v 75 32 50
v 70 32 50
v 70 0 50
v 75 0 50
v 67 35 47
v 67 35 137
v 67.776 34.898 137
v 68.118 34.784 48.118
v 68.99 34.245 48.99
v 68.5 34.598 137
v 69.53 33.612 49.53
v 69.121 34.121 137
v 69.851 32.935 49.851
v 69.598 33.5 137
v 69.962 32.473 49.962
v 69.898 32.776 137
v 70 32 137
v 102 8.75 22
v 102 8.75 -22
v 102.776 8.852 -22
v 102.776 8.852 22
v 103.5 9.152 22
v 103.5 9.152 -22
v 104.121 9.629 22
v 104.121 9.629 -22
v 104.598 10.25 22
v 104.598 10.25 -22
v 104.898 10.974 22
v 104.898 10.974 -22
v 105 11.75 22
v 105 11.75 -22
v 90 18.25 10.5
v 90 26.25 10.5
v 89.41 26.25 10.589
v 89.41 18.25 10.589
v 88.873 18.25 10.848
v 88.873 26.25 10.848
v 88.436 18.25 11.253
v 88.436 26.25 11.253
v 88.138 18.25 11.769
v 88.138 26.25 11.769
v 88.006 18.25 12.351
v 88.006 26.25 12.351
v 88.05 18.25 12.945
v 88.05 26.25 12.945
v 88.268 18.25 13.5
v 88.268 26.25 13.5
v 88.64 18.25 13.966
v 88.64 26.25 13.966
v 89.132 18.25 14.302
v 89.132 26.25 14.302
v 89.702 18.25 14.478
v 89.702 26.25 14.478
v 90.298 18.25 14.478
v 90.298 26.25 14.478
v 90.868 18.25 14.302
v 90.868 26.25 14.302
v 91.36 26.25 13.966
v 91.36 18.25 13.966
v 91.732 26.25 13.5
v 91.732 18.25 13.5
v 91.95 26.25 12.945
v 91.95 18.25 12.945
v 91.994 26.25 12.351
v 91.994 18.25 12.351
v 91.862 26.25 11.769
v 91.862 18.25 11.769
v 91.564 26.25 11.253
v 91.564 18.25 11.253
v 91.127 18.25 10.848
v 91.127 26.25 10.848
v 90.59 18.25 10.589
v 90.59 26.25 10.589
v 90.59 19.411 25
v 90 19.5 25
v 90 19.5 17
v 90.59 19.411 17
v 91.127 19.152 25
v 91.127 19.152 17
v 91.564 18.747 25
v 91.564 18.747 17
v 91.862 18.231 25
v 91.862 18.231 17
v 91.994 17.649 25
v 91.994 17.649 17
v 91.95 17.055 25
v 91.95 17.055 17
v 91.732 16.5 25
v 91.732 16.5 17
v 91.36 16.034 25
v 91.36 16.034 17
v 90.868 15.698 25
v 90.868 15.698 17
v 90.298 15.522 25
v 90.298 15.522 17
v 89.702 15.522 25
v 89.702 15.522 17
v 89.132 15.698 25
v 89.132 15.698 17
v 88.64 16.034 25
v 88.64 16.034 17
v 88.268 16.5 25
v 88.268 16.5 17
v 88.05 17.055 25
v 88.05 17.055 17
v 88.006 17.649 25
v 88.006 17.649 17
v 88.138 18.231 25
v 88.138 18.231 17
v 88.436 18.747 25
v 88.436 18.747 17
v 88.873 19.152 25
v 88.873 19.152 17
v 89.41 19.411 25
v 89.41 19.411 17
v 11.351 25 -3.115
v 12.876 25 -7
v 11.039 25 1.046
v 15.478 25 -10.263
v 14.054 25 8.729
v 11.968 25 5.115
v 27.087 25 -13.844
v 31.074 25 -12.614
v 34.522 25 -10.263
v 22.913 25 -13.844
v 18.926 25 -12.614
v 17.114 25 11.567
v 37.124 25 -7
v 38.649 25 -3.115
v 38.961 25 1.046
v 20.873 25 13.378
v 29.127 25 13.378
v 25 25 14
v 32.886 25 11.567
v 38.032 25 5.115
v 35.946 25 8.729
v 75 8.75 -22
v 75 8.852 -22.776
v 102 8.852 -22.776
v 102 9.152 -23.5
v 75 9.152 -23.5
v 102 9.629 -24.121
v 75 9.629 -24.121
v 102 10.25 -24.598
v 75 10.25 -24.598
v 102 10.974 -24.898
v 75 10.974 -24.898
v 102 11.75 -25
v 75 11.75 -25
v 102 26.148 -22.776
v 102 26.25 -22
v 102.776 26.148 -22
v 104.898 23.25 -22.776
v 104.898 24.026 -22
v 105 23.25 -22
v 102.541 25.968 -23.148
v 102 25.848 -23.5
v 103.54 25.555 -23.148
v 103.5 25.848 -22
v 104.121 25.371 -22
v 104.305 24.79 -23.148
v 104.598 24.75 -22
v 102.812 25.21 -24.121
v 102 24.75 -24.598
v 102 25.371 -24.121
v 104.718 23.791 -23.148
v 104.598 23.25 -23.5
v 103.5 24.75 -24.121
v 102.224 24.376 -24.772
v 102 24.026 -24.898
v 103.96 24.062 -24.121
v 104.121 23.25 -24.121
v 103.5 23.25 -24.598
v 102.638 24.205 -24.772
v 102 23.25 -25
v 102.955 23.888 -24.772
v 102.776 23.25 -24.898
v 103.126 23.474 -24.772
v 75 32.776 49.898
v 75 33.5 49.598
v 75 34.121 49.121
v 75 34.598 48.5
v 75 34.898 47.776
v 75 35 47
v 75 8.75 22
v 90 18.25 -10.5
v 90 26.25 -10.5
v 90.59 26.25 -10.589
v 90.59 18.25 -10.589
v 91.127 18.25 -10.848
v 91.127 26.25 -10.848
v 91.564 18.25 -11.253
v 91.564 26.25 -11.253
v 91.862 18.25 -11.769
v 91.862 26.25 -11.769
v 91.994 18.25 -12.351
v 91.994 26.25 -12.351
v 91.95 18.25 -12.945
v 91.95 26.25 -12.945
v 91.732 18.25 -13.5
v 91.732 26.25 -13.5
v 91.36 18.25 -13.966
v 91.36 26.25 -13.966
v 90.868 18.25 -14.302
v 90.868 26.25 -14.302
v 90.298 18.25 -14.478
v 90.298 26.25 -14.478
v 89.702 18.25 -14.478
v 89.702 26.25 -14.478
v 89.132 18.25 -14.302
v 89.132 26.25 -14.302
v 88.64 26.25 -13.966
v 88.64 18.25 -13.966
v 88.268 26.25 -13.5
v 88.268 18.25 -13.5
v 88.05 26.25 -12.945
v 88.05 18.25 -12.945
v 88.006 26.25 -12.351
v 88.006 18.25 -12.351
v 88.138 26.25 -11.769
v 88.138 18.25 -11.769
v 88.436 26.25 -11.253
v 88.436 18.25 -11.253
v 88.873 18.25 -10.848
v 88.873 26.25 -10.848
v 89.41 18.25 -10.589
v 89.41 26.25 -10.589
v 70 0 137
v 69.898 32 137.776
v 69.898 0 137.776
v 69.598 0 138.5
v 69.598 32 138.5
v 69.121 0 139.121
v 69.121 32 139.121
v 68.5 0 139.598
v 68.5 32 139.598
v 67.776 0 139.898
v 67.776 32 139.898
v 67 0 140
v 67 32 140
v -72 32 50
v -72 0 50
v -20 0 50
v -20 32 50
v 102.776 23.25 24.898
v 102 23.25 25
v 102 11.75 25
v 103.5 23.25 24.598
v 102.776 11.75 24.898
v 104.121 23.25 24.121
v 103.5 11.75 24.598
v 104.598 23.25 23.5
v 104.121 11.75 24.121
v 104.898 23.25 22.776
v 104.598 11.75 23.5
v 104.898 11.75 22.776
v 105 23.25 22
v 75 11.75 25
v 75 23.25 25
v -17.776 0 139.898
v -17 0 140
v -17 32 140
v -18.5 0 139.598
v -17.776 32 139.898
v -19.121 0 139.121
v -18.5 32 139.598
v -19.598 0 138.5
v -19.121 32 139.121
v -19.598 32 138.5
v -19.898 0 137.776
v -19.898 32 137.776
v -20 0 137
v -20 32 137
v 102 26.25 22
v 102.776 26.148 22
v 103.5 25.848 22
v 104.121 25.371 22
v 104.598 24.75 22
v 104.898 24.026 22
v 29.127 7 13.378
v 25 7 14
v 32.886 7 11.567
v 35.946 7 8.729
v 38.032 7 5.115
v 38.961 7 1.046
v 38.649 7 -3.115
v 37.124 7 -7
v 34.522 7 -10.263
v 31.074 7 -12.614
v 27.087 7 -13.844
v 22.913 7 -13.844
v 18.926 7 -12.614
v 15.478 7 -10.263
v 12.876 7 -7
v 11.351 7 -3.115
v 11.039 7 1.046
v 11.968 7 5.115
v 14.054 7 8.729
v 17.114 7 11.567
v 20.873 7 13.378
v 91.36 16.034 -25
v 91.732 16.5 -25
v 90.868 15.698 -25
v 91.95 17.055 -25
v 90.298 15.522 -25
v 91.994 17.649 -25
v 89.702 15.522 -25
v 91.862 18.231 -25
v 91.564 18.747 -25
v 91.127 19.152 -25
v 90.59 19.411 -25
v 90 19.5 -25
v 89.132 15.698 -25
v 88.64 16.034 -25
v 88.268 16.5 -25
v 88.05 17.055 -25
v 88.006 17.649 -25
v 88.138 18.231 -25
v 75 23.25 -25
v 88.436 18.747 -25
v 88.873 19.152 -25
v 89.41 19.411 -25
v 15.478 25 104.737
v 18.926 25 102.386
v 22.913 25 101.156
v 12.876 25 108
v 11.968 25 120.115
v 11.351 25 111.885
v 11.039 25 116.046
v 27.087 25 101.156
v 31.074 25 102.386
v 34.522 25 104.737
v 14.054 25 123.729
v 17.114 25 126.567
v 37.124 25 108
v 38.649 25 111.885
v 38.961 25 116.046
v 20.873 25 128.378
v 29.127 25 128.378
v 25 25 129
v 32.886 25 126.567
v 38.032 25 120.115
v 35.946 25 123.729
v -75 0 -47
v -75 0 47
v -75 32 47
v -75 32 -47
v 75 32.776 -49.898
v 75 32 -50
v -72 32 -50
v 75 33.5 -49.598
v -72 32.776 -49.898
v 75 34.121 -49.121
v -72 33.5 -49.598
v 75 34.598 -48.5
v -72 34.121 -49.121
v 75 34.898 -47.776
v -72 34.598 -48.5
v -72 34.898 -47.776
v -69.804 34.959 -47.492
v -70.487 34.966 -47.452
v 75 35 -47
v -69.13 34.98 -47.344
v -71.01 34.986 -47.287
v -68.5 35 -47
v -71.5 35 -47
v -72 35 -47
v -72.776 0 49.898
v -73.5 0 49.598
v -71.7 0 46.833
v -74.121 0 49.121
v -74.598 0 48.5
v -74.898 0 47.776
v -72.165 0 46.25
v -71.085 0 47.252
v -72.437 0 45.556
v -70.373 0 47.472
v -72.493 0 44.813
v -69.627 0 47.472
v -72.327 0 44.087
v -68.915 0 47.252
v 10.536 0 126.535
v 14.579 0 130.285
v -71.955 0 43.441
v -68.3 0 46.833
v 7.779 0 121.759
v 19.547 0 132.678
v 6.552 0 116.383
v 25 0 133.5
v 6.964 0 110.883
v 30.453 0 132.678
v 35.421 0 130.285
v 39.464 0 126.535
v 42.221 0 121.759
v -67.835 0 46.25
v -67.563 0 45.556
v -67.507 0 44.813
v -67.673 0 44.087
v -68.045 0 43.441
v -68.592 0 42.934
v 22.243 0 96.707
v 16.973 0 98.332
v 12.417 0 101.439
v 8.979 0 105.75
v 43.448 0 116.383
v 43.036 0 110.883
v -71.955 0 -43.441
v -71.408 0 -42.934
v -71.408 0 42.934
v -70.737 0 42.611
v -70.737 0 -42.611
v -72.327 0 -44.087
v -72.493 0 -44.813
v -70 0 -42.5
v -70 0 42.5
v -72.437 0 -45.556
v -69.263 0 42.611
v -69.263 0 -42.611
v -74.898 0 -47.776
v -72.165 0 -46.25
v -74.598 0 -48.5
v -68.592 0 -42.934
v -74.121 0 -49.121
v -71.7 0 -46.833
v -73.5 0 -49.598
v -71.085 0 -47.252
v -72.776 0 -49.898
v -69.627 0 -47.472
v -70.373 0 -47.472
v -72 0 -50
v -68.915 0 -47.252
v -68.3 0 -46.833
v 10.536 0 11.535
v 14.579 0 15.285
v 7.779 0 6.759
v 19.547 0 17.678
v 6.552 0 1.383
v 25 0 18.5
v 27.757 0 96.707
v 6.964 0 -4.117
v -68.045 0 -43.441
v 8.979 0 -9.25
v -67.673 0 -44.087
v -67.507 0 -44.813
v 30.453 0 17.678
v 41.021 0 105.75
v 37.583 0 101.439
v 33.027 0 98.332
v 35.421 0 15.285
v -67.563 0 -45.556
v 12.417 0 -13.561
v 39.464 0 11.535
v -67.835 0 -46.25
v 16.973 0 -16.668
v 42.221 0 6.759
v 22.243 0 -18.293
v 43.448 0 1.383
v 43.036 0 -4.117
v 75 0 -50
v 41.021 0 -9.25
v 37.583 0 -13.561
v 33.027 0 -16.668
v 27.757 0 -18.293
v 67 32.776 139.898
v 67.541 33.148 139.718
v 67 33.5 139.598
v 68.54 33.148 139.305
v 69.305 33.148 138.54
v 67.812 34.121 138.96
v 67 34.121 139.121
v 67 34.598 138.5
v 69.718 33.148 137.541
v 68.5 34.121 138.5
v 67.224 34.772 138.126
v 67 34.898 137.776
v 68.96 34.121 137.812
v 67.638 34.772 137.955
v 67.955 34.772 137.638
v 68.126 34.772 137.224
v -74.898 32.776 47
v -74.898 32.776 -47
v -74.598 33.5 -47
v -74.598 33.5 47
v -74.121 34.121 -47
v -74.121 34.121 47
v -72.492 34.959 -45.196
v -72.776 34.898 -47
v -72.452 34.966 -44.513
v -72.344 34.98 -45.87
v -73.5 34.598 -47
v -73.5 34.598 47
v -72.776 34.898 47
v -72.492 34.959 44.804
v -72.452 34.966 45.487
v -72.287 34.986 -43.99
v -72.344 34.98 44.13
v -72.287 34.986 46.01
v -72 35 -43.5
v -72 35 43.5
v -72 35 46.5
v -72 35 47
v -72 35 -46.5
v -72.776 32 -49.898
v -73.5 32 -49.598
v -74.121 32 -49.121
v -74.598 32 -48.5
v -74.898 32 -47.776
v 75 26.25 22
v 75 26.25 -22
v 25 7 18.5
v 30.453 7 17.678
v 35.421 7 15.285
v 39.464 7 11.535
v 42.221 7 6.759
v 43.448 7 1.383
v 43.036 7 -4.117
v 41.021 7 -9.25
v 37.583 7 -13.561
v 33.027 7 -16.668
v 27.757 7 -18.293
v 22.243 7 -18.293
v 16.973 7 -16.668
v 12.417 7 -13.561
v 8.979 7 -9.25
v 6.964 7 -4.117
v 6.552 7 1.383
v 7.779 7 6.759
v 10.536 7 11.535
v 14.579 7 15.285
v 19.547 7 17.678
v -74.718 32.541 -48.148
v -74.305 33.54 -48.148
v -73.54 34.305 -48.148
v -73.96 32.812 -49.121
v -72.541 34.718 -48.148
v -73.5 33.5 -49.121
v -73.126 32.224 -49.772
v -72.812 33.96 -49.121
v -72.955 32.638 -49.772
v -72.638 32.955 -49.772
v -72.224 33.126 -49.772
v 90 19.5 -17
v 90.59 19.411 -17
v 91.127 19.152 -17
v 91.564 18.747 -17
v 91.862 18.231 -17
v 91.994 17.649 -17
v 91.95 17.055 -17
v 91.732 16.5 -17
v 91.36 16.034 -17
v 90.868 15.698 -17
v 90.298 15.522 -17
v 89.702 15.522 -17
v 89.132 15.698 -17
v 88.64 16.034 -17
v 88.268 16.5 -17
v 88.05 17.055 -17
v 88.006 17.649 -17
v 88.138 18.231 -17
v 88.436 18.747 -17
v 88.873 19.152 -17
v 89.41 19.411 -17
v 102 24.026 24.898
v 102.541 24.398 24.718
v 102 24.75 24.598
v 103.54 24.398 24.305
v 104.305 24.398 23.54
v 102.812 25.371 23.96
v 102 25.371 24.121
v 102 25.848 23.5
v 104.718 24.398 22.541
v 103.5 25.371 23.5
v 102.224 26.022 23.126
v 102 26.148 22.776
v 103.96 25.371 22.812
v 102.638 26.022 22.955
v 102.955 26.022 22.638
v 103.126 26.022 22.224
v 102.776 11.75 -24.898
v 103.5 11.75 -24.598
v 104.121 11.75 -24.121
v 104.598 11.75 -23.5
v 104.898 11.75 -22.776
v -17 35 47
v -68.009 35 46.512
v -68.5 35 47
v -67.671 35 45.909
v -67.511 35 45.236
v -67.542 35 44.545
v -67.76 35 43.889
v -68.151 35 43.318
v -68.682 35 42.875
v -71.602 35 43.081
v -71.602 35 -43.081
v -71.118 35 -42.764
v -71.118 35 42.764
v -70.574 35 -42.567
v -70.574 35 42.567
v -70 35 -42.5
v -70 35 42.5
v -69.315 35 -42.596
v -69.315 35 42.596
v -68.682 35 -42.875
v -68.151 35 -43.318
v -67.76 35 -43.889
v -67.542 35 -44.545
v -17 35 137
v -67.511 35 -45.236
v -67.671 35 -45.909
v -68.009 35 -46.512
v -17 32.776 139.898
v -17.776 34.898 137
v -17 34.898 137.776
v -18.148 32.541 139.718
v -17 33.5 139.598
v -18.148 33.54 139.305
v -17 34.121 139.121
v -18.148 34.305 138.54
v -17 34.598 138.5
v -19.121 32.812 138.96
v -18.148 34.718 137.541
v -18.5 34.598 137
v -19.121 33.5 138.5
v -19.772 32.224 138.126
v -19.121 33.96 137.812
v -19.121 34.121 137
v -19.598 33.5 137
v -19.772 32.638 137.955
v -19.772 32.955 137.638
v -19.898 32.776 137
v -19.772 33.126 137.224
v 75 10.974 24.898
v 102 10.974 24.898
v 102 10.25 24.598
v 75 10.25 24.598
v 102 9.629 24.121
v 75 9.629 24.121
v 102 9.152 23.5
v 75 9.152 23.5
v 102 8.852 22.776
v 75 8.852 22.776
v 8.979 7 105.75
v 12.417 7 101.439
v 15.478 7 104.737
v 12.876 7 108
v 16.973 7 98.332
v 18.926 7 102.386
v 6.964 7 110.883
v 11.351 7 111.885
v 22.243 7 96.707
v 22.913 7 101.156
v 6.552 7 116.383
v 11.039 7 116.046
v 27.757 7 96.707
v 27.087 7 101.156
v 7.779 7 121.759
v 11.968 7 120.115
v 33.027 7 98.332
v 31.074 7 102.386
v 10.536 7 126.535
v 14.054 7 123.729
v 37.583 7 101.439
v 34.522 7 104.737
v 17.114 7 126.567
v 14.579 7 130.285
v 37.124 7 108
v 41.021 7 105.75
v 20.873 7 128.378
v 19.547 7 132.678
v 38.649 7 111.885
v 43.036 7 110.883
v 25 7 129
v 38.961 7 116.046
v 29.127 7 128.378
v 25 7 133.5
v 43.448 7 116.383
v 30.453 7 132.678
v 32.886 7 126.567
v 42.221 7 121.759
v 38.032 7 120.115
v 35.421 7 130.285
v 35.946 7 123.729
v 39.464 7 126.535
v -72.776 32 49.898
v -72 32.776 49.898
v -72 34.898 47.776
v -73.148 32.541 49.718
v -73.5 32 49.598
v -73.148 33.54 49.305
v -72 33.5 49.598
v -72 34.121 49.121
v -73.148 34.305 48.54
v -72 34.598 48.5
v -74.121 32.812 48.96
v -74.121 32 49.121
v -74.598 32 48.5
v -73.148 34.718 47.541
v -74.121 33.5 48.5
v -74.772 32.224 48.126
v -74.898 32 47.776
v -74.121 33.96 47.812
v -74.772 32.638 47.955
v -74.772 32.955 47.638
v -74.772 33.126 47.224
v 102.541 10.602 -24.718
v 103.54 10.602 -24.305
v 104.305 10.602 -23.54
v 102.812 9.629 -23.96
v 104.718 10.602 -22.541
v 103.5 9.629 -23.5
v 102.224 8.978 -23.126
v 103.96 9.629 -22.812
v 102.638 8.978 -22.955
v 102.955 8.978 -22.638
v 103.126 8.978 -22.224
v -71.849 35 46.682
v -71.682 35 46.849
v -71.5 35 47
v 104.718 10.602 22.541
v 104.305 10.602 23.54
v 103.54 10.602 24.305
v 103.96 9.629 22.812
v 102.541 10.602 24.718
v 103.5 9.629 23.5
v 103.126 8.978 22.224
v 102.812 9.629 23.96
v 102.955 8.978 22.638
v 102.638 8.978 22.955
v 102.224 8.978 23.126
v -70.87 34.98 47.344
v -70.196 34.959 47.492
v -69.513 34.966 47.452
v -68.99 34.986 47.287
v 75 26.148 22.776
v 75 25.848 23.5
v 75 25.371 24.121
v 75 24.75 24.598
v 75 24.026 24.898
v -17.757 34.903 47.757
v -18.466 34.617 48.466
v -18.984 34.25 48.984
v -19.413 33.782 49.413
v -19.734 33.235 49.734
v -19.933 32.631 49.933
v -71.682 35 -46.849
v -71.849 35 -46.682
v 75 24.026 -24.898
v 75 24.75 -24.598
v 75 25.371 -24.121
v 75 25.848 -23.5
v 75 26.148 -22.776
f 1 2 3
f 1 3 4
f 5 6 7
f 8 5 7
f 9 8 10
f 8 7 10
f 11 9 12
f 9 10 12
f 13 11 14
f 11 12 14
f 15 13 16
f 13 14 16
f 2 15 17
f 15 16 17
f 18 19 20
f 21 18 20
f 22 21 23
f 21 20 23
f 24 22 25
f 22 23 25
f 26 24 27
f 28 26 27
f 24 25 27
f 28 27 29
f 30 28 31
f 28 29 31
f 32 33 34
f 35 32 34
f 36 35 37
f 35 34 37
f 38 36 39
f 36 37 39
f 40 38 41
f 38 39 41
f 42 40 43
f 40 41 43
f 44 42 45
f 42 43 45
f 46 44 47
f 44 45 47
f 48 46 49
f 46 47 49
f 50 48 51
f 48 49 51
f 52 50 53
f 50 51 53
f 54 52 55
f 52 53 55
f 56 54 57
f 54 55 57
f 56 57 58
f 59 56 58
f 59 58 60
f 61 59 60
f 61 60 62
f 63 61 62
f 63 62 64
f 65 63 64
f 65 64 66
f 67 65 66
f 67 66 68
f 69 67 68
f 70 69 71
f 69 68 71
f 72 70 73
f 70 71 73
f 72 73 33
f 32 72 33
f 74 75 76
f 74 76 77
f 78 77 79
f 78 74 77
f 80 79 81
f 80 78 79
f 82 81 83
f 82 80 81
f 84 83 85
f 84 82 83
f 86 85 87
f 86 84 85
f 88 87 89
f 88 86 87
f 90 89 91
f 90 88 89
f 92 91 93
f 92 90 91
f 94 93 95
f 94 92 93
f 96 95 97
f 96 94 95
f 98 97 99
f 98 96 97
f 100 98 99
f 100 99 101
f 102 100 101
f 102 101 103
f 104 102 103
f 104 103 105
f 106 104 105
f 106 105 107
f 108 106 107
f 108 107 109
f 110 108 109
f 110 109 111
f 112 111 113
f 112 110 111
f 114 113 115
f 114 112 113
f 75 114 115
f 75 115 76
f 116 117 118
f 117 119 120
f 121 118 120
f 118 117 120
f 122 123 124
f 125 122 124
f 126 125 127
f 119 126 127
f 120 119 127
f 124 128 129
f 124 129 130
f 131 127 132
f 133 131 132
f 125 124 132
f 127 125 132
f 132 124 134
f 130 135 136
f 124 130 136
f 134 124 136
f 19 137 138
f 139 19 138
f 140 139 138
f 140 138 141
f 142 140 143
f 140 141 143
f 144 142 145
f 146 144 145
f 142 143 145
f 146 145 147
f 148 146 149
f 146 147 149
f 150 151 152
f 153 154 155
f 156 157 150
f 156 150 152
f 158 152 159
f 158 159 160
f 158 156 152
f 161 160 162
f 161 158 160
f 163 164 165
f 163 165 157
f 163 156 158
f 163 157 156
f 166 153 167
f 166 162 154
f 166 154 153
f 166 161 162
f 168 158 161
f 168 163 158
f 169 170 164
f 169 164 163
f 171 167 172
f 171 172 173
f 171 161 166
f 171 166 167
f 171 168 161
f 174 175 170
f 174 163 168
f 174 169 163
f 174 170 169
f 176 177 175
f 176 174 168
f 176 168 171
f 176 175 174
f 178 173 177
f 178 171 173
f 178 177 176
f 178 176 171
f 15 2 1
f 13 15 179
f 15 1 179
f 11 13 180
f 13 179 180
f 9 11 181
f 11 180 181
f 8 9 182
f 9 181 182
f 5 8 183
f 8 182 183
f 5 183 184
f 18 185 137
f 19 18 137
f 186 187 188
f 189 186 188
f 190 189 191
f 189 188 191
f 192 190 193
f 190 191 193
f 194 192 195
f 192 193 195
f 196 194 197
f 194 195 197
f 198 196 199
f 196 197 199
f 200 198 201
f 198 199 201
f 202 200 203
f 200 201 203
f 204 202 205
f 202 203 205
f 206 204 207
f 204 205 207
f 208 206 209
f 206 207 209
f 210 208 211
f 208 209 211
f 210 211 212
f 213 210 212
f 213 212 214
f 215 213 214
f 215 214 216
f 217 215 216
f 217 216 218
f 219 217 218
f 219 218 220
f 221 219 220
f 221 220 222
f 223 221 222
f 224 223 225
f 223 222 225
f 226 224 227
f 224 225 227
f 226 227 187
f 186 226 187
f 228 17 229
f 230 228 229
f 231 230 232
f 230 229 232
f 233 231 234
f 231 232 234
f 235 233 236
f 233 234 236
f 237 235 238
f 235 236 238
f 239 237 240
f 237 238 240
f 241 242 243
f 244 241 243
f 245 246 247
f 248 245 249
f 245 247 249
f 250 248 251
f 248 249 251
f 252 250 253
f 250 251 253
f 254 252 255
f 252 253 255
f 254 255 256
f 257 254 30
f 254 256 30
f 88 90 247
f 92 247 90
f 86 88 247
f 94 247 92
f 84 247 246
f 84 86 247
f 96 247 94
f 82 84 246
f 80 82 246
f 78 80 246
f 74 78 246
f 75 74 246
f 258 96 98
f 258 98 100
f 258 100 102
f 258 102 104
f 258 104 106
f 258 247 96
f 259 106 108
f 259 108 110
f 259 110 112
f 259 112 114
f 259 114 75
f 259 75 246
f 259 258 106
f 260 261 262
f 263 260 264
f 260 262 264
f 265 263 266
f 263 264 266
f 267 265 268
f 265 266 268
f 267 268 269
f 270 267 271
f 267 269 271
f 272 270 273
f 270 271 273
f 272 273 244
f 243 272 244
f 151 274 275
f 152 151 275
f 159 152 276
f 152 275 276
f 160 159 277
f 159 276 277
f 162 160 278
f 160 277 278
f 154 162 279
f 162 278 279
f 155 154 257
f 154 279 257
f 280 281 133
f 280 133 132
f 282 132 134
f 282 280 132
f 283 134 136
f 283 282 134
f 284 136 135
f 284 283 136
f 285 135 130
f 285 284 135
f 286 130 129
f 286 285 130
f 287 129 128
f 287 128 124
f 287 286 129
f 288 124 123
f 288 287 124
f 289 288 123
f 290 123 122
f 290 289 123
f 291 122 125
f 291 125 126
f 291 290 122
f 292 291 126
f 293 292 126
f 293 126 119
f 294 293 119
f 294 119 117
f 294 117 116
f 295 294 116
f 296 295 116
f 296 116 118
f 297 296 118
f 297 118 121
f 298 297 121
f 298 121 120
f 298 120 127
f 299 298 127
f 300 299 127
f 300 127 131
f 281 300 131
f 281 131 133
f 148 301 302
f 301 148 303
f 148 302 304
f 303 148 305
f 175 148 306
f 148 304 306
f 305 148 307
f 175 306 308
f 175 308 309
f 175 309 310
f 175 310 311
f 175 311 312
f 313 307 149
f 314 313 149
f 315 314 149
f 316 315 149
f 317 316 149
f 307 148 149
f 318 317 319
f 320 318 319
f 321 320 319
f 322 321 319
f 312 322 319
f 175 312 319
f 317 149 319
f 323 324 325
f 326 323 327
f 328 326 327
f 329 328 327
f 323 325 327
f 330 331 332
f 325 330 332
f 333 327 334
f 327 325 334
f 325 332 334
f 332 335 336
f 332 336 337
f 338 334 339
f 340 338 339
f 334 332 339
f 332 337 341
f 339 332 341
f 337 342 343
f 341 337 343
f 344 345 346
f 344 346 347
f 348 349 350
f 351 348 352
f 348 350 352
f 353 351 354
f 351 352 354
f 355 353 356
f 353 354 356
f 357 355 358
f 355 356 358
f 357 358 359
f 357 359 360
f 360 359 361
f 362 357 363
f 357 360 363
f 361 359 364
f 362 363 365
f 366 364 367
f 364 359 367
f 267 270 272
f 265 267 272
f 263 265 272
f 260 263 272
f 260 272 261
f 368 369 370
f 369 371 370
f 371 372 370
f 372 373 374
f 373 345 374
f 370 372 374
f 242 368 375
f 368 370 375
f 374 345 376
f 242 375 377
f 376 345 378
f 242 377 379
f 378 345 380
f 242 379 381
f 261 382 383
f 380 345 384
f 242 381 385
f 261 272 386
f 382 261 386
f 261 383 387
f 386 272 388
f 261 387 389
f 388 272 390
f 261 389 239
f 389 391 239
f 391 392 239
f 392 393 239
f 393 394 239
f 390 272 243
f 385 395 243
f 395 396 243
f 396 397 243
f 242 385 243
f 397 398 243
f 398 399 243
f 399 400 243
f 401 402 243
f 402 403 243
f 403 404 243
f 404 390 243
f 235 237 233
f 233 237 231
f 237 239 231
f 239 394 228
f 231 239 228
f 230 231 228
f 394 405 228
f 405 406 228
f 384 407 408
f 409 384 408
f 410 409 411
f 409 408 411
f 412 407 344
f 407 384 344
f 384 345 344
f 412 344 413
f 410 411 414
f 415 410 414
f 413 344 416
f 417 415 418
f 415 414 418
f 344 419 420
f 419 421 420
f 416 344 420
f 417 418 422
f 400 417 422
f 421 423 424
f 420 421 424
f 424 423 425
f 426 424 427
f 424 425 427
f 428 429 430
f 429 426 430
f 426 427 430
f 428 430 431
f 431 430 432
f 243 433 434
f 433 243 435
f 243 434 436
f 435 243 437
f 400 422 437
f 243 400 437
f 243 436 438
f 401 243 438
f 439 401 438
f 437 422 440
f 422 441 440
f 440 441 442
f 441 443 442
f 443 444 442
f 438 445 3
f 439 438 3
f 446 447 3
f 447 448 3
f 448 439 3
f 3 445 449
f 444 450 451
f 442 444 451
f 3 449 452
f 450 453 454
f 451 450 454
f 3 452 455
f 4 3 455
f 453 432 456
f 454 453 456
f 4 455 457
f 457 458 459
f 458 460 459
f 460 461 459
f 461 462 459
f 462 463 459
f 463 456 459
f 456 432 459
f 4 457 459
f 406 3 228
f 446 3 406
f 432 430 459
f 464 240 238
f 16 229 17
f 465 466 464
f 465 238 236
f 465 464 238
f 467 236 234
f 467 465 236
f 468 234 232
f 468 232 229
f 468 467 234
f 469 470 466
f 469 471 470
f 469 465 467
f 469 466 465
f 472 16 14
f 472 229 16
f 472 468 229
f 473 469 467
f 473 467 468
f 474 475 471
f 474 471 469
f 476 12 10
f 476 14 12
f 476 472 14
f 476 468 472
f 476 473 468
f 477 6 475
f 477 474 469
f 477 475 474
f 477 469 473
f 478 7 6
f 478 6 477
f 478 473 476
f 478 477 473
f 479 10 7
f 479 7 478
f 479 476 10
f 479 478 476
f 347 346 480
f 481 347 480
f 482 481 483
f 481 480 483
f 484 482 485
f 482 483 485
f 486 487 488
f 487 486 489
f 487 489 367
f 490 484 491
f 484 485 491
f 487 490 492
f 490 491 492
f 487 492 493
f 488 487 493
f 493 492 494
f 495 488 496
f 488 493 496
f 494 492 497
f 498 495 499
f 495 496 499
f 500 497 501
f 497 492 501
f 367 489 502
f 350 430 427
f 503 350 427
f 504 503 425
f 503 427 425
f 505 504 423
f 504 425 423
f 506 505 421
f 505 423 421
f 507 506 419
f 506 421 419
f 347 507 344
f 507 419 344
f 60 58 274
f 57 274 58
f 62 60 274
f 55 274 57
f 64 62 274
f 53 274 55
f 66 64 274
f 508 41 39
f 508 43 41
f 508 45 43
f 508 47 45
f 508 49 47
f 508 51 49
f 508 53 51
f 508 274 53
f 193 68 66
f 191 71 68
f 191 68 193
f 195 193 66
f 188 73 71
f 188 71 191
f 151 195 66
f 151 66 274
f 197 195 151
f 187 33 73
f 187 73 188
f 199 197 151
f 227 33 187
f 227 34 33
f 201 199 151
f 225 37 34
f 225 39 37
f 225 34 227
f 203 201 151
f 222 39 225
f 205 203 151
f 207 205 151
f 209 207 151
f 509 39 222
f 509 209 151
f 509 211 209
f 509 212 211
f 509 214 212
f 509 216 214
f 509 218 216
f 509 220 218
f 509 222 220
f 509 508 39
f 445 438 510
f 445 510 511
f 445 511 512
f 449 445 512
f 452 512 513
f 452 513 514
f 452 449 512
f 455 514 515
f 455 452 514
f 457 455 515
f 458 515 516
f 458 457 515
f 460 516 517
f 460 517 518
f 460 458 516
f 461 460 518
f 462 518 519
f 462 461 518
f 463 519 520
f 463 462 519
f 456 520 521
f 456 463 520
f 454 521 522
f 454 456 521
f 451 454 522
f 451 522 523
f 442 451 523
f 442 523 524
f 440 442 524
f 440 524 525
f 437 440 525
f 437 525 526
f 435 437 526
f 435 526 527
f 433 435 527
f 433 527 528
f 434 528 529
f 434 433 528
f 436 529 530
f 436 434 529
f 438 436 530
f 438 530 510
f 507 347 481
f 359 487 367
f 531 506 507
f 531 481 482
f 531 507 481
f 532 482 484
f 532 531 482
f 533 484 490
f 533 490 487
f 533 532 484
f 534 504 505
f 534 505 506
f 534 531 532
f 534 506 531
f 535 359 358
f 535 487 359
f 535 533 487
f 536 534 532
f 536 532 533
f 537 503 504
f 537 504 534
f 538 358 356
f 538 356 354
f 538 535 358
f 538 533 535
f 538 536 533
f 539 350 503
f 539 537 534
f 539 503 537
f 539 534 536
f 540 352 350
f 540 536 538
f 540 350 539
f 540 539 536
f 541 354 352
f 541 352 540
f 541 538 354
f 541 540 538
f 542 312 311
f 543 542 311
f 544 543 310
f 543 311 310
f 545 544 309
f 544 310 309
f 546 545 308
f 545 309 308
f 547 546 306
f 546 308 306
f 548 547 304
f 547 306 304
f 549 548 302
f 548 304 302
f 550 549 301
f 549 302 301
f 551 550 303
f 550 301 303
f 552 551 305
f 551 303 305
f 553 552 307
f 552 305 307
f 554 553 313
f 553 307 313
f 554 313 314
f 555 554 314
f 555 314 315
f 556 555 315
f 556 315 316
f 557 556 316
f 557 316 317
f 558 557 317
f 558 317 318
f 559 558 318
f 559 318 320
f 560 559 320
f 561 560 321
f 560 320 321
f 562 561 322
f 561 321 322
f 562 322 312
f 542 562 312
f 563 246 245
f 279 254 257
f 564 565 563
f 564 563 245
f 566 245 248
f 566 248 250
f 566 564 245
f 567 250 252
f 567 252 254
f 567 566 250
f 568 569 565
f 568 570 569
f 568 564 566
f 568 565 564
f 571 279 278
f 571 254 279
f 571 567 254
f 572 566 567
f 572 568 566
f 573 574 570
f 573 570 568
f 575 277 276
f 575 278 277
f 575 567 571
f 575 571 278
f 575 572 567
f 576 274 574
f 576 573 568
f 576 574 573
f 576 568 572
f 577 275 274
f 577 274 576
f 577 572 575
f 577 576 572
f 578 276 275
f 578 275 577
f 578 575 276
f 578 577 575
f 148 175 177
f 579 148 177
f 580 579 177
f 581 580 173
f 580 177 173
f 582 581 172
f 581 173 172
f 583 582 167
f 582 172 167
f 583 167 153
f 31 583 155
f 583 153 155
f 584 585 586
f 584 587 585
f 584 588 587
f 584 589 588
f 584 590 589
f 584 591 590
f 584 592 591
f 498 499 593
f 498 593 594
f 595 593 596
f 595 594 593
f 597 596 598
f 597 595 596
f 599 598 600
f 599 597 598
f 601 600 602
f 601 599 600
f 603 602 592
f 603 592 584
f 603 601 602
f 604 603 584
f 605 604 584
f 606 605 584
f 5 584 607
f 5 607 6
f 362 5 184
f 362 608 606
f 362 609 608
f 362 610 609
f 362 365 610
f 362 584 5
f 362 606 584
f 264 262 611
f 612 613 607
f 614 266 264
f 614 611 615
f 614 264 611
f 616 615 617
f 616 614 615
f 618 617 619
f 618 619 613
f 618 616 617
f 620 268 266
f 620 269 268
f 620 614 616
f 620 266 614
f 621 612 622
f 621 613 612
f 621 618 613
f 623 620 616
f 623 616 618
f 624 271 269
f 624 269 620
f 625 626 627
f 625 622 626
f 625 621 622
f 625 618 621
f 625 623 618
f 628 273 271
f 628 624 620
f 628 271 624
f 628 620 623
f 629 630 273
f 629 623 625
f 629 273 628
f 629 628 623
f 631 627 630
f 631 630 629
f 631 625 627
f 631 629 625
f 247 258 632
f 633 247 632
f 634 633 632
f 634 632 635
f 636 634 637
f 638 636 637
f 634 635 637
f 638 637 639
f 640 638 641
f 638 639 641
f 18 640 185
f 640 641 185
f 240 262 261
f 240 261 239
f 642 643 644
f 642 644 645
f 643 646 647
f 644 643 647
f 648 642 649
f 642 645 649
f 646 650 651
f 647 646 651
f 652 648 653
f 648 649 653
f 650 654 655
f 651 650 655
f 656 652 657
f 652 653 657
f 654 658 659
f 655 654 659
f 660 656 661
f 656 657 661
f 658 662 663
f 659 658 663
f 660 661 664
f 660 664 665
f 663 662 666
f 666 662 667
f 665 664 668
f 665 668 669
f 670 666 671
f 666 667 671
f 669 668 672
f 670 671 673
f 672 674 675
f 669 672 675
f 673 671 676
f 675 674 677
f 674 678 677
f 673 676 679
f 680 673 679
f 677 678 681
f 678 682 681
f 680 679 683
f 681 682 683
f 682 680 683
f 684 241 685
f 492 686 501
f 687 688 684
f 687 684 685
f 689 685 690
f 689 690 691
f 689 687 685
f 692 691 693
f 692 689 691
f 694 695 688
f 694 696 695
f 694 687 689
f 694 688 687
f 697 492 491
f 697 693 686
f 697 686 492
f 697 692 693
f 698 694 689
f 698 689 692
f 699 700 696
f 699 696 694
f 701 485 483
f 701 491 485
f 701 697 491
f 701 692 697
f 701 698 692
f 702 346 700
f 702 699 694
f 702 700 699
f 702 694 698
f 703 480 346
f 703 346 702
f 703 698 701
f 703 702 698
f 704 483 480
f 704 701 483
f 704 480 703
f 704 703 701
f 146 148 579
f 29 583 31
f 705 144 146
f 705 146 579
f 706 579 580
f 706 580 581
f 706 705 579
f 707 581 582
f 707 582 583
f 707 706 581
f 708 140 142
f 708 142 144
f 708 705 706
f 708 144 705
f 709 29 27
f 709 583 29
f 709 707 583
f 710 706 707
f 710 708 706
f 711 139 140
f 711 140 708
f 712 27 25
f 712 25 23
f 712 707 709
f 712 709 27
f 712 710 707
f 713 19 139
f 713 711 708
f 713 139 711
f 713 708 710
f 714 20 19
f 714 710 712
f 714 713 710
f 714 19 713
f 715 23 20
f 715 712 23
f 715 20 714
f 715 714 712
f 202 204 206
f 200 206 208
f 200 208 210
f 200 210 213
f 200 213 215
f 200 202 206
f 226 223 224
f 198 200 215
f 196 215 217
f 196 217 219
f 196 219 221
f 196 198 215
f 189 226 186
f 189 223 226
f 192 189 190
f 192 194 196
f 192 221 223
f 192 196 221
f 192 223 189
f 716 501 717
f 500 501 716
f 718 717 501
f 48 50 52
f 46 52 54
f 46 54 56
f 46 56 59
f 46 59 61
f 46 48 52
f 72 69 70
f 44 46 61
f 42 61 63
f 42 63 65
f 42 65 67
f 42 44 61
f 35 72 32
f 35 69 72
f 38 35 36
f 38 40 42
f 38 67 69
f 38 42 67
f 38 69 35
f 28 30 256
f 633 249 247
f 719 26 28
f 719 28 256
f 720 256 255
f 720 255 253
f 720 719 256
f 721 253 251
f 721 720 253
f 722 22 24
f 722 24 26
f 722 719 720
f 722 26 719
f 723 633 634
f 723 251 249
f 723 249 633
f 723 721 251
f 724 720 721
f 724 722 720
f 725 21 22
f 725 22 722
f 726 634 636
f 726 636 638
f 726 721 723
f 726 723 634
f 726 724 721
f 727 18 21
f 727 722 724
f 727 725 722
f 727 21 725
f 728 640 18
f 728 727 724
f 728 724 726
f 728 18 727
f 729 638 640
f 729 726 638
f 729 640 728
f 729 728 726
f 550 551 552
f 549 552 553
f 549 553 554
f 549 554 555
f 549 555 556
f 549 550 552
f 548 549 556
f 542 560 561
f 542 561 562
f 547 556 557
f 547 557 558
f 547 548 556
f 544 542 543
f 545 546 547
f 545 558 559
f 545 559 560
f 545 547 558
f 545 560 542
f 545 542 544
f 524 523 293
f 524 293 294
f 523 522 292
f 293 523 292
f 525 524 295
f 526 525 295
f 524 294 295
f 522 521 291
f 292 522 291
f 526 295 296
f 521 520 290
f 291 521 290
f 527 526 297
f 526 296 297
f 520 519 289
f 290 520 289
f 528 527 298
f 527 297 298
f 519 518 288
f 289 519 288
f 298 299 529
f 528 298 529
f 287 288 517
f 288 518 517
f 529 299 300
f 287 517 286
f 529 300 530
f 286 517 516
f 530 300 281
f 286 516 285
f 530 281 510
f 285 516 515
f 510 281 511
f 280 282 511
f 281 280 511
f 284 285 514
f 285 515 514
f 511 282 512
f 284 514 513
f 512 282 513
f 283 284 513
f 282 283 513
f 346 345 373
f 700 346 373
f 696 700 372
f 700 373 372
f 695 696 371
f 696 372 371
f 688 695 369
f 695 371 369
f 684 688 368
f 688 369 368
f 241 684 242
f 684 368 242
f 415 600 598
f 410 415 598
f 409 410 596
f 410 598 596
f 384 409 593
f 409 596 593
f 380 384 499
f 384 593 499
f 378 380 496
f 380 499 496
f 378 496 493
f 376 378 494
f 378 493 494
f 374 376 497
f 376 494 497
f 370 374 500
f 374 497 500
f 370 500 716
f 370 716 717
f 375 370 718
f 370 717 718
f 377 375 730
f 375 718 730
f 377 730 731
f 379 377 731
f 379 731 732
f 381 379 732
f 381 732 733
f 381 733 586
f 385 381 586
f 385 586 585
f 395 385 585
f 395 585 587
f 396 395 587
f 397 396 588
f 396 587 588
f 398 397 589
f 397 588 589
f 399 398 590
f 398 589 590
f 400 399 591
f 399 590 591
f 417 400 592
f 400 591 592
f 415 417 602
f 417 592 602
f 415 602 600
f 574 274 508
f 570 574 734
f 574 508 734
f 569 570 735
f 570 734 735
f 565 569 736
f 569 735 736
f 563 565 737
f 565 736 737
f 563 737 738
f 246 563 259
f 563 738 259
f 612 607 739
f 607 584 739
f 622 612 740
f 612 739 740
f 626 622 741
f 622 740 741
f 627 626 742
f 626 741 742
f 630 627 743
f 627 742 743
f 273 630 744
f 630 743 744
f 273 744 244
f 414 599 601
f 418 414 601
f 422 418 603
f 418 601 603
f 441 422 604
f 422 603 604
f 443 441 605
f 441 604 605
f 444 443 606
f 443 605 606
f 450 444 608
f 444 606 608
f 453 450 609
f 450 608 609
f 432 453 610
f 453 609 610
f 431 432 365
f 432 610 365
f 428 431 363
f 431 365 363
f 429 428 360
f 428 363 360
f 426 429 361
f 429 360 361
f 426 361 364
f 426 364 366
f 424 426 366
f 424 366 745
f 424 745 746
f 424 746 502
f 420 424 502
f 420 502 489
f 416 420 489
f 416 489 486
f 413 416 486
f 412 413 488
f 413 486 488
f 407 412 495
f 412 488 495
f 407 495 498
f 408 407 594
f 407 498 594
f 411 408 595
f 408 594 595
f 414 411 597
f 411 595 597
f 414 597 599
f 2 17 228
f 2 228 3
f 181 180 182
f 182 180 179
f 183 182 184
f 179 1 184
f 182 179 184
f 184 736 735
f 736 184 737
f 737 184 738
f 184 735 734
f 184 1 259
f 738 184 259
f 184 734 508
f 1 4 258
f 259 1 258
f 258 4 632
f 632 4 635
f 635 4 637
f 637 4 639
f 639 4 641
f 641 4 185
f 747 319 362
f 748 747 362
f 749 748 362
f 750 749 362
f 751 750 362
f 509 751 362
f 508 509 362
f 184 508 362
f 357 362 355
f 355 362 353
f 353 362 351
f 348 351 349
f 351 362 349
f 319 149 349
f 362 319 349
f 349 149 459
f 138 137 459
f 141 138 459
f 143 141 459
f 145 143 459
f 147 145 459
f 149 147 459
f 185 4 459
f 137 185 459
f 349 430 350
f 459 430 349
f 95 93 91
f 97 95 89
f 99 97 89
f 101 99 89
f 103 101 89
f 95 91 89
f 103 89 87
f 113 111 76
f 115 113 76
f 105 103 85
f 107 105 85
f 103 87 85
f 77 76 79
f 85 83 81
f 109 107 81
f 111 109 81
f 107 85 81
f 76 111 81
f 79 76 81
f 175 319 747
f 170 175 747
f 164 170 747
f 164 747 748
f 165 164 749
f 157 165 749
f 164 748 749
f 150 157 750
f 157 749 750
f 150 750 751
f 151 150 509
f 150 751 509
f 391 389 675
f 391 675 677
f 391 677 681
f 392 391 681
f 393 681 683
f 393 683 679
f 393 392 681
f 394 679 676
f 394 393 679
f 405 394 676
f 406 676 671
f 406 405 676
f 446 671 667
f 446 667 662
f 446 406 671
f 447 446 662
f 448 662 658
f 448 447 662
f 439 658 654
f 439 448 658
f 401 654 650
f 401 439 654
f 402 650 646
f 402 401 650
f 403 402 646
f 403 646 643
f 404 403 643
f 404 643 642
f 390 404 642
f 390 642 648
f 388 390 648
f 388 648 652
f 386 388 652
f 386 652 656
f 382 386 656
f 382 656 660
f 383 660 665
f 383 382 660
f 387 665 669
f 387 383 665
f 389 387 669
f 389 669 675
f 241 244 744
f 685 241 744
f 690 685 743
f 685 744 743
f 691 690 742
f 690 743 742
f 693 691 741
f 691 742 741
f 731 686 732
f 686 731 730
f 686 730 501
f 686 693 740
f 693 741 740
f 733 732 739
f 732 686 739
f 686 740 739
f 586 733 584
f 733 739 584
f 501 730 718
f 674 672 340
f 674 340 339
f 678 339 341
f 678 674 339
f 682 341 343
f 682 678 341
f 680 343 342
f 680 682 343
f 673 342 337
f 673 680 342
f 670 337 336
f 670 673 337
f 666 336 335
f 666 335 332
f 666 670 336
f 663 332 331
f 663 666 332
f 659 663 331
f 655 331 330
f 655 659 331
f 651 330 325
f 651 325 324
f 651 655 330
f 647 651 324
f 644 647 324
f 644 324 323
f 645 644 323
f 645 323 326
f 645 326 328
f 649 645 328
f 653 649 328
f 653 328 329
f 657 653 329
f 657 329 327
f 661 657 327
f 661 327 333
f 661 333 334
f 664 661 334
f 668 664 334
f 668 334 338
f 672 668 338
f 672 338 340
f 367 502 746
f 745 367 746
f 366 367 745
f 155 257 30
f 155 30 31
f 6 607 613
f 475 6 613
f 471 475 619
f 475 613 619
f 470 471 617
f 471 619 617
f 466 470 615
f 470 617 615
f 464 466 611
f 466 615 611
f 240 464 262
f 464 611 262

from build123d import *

# Parameters (mm, degrees)
SKETCH1_W           = 150
SKETCH1_H           = 100
BOSS_EXTRUDE1_DEPTH = 35
SKETCH2_R           = 2.5
CUT_EXTRUDE1_DEPTH  = 97.695398029
SKETCH3_W           = 90
SKETCH3_H           = 90
BOSS_EXTRUDE2_DEPTH = 35
CUT_EXTRUDE2_START  = -35
SKETCH4_R           = 18.5
CUT_EXTRUDE2_DEPTH  = 7
CUT_EXTRUDE3_START  = -35
SKETCH5_R           = 14
CUT_EXTRUDE3_DEPTH  = 25
SKETCH6_W           = 50
SKETCH6_H           = 17.5
BOSS_EXTRUDE3_DEPTH = 30
SKETCH7_R           = 2
CUT_EXTRUDE4_DEPTH  = 8
SKETCH8_R           = 2
CUT_EXTRUDE5_DEPTH  = 8
FILLET1_R           = 3


with BuildPart() as part:
    # Sketch1 → Boss-Extrude1 (new body)
    with BuildSketch(Plane(origin=(0, 0, 0), x_dir=(1, 0, 0), z_dir=(0, 1, 0))):
        Rectangle(SKETCH1_W, SKETCH1_H)
    extrude(amount=BOSS_EXTRUDE1_DEPTH)

    # Sketch2 → Cut-Extrude1 (cut, through all)
    with BuildSketch(Plane(origin=(0, 35, 0), x_dir=(1, 0, 0), z_dir=(0, 1, 0))):
        with Locations(Location((-70, 45, 0), (0, 0, 270))):
            Circle(SKETCH2_R)
        with Locations(Location((-70, -45, 0), (0, 0, 90))):
            Circle(SKETCH2_R)
    extrude(amount=-CUT_EXTRUDE1_DEPTH, mode=Mode.SUBTRACT)

    # Sketch3 → Boss-Extrude2 (add)
    with BuildSketch(Plane(origin=(0, 35, 0), x_dir=(1, 0, 0), z_dir=(0, 1, 0))):
        with Locations((25, -95)):
            Rectangle(SKETCH3_W, SKETCH3_H)
    extrude(amount=-BOSS_EXTRUDE2_DEPTH)

    # Sketch4 → Cut-Extrude2 (cut)
    with BuildSketch(Plane(origin=(0, 35, 0), x_dir=(1, 0, 0), z_dir=(0, 1, 0)).offset(CUT_EXTRUDE2_START)):
        with Locations(Location((25, -115, 0), (0, 0, 270))):
            Circle(SKETCH4_R)
        with Locations(Location((25, 0, 0), (0, 0, 270))):
            Circle(SKETCH4_R)
    extrude(amount=CUT_EXTRUDE2_DEPTH, mode=Mode.SUBTRACT)

    # Sketch5 → Cut-Extrude3 (cut)
    with BuildSketch(Plane(origin=(0, 35, 0), x_dir=(1, 0, 0), z_dir=(0, 1, 0)).offset(CUT_EXTRUDE3_START)):
        with Locations(Location((25, -115, 0), (0, 0, 270))):
            Circle(SKETCH5_R)
        with Locations(Location((25, 0, 0), (0, 0, 270))):
            Circle(SKETCH5_R)
    extrude(amount=CUT_EXTRUDE3_DEPTH, mode=Mode.SUBTRACT)

    # Sketch6 → Boss-Extrude3 (add)
    with BuildSketch(Plane(origin=(75, 0, 0), x_dir=(0, 0, -1), z_dir=(1, 0, 0))):
        with Locations((0, 17.5)):
            Rectangle(SKETCH6_W, SKETCH6_H)
    extrude(amount=BOSS_EXTRUDE3_DEPTH)

    # Sketch7 → Cut-Extrude4 (cut)
    with BuildSketch(Plane(origin=(0, 26.25, 0), x_dir=(1, 0, 0), z_dir=(0, 1, 0))):
        with Locations(Location((90, 12.5, 0), (0, 0, 270))):
            Circle(SKETCH7_R)
        with Locations(Location((90, -12.5, 0), (0, 0, 90))):
            Circle(SKETCH7_R)
    extrude(amount=-CUT_EXTRUDE4_DEPTH, mode=Mode.SUBTRACT)

    # Sketch8 → Cut-Extrude5 (cut)
    with BuildSketch(Plane(origin=(0, 0, -25), x_dir=(-1, 0, 0), z_dir=(0, 0, -1))):
        with Locations(Location((-90, 17.5, 0), (0, 0, 90))):
            Circle(SKETCH8_R)
    cut_extrude5 = extrude(amount=-CUT_EXTRUDE5_DEPTH, mode=Mode.SUBTRACT)

    # Mirror1: Cut-Extrude5 across plane
    add(cut_extrude5.mirror(Plane.XY), mode=Mode.SUBTRACT)

    # Fillet1
    # the kernel refuses this fillet: 3 mm, written as the material it takes off along each edge
    with BuildSketch(Plane(origin=(-72, 32, 47), x_dir=(0, 1, 0), z_dir=(-1, 0, 0))) as fillet1_piece_1_section:
        Polygon((0, 0), (FILLET1_R, 0), (FILLET1_R, -FILLET1_R), (0, -FILLET1_R), align=None)
    fillet1_piece_1 = extrude(amount=FILLET1_R, mode=Mode.PRIVATE)
    fillet1_piece_1 = fillet1_piece_1 - Plane(origin=(-72, 32, 47), x_dir=(0, -0.7071067811865475, -0.7071067811865475), z_dir=(-1, 0, 0)) * Sphere(FILLET1_R, mode=Mode.PRIVATE)
    add(fillet1_piece_1, mode=Mode.SUBTRACT)
    with BuildSketch(Plane(origin=(-72, 32, -47), x_dir=(-1, 0, 0), z_dir=(0, 0, -1))) as fillet1_piece_2_section:
        Polygon((0, 0), (FILLET1_R, 0), (FILLET1_R, FILLET1_R), (0, FILLET1_R), align=None)
    fillet1_piece_2 = extrude(amount=FILLET1_R, mode=Mode.PRIVATE)
    fillet1_piece_2 = fillet1_piece_2 - Plane(origin=(-72, 32, -47), x_dir=(0.7071067811865475, -0.7071067811865475, 0), z_dir=(0, 0, -1)) * Sphere(FILLET1_R, mode=Mode.PRIVATE)
    add(fillet1_piece_2, mode=Mode.SUBTRACT)
    with BuildSketch(Plane(origin=(67, 32, 137), x_dir=(1, 0, 0), z_dir=(0, 1, 0))) as fillet1_piece_3_section:
        Polygon((0, 0), (FILLET1_R, 0), (FILLET1_R, -FILLET1_R), (0, -FILLET1_R), align=None)
    fillet1_piece_3 = extrude(amount=FILLET1_R, mode=Mode.PRIVATE)
    fillet1_piece_3 = fillet1_piece_3 - Plane(origin=(67, 32, 137), x_dir=(-0.7071067811865475, 0, -0.7071067811865475), z_dir=(0, 1, 0)) * Sphere(FILLET1_R, mode=Mode.PRIVATE)
    add(fillet1_piece_3, mode=Mode.SUBTRACT)
    with BuildSketch(Plane(origin=(-17, 32, 137), x_dir=(0, 1, 0), z_dir=(-1, 0, 0))) as fillet1_piece_4_section:
        Polygon((0, 0), (FILLET1_R, 0), (FILLET1_R, -FILLET1_R), (0, -FILLET1_R), align=None)
    fillet1_piece_4 = extrude(amount=FILLET1_R, mode=Mode.PRIVATE)
    fillet1_piece_4 = fillet1_piece_4 - Plane(origin=(-17, 32, 137), x_dir=(0, -0.7071067811865475, -0.7071067811865475), z_dir=(-1, 0, 0)) * Sphere(FILLET1_R, mode=Mode.PRIVATE)
    add(fillet1_piece_4, mode=Mode.SUBTRACT)
    with BuildSketch(Plane(origin=(102, 11.75, -22), x_dir=(0, 0, -1), z_dir=(0, -1, 0))) as fillet1_piece_5_section:
        Polygon((0, 0), (FILLET1_R, 0), (FILLET1_R, FILLET1_R), (0, FILLET1_R), align=None)
    fillet1_piece_5 = extrude(amount=FILLET1_R, mode=Mode.PRIVATE)
    fillet1_piece_5 = fillet1_piece_5 - Plane(origin=(102, 11.75, -22), x_dir=(-0.7071067811865475, 0, 0.7071067811865475), z_dir=(0, -1, 0)) * Sphere(FILLET1_R, mode=Mode.PRIVATE)
    add(fillet1_piece_5, mode=Mode.SUBTRACT)
    with BuildSketch(Plane(origin=(102, 23.25, -22), x_dir=(0, 1, 0), z_dir=(0, 0, -1))) as fillet1_piece_6_section:
        Polygon((0, 0), (FILLET1_R, 0), (FILLET1_R, FILLET1_R), (0, FILLET1_R), align=None)
    fillet1_piece_6 = extrude(amount=FILLET1_R, mode=Mode.PRIVATE)
    fillet1_piece_6 = fillet1_piece_6 - Plane(origin=(102, 23.25, -22), x_dir=(-0.7071067811865475, -0.7071067811865475, 0), z_dir=(0, 0, -1)) * Sphere(FILLET1_R, mode=Mode.PRIVATE)
    add(fillet1_piece_6, mode=Mode.SUBTRACT)
    with BuildSketch(Plane(origin=(102, 23.25, 22), x_dir=(1, 0, 0), z_dir=(0, 1, 0))) as fillet1_piece_7_section:
        Polygon((0, 0), (FILLET1_R, 0), (FILLET1_R, -FILLET1_R), (0, -FILLET1_R), align=None)
    fillet1_piece_7 = extrude(amount=FILLET1_R, mode=Mode.PRIVATE)
    fillet1_piece_7 = fillet1_piece_7 - Plane(origin=(102, 23.25, 22), x_dir=(-0.7071067811865475, 0, -0.7071067811865475), z_dir=(0, 1, 0)) * Sphere(FILLET1_R, mode=Mode.PRIVATE)
    add(fillet1_piece_7, mode=Mode.SUBTRACT)
    with BuildSketch(Plane(origin=(102, 11.75, 22), x_dir=(1, 0, 0), z_dir=(0, -1, 0))) as fillet1_piece_8_section:
        Polygon((0, 0), (FILLET1_R, 0), (FILLET1_R, FILLET1_R), (0, FILLET1_R), align=None)
    fillet1_piece_8 = extrude(amount=FILLET1_R, mode=Mode.PRIVATE)
    fillet1_piece_8 = fillet1_piece_8 - Plane(origin=(102, 11.75, 22), x_dir=(-0.7071067811865475, 0, -0.7071067811865475), z_dir=(0, -1, 0)) * Sphere(FILLET1_R, mode=Mode.PRIVATE)
    add(fillet1_piece_8, mode=Mode.SUBTRACT)
    with BuildSketch(Plane(origin=(-75, 35, 47), x_dir=(0, -1, 0), z_dir=(0, 0, -1))) as fillet1_piece_9:
        with BuildLine():
            CenterArc((FILLET1_R, -FILLET1_R), FILLET1_R, 90, 90)
            Line((0, -FILLET1_R), (0, 0))
            Line((0, 0), (FILLET1_R, 0))
        make_face()
    extrude(amount=94, mode=Mode.SUBTRACT)
    with BuildSketch(Plane(origin=(-20, 35, 50), x_dir=(0, 0, -1), z_dir=(-1, 0, 0))) as fillet1_piece_10:
        with BuildLine():
            CenterArc((FILLET1_R, FILLET1_R), FILLET1_R, 180, 90)
            Line((0, FILLET1_R), (0, 0))
            Line((0, 0), (FILLET1_R, 0))
        make_face()
    extrude(amount=52, mode=Mode.SUBTRACT)
    with BuildSketch(Plane(origin=(82.5, 35, 50), x_dir=(0, 0, -1), z_dir=(-1, 0, 0))) as fillet1_piece_11:
        with BuildLine():
            CenterArc((FILLET1_R, FILLET1_R), FILLET1_R, 180, 90)
            Line((0, FILLET1_R), (0, 0))
            Line((0, 0), (FILLET1_R, 0))
        make_face()
    extrude(amount=12.5, mode=Mode.SUBTRACT)
    with BuildSketch(Plane(origin=(70, 32, 140), x_dir=(0, 0, -1), z_dir=(0, -1, 0)), Plane(origin=(-75, -7.5, 50), x_dir=(0, 0, -1), z_dir=(0, 1, 0)), Plane(origin=(-75, -7.5, -50), x_dir=(1, 0, 0), z_dir=(0, 1, 0))) as fillet1_piece_12:
        with BuildLine():
            CenterArc((FILLET1_R, -FILLET1_R), FILLET1_R, 90, 90)
            Line((0, -FILLET1_R), (0, 0))
            Line((0, 0), (FILLET1_R, 0))
        make_face()
    extrude(amount=39.5, mode=Mode.SUBTRACT)
    with BuildSketch(Plane(origin=(-20, 32, 140), x_dir=(0, 0, -1), z_dir=(0, -1, 0))) as fillet1_piece_13:
        with BuildLine():
            CenterArc((FILLET1_R, FILLET1_R), FILLET1_R, 180, 90)
            Line((0, FILLET1_R), (0, 0))
            Line((0, 0), (FILLET1_R, 0))
        make_face()
    extrude(amount=39.5, mode=Mode.SUBTRACT)
    with BuildSketch(Plane(origin=(70, 35, 137), x_dir=(-1, 0, 0), z_dir=(0, 0, -1)), Plane(origin=(-20, 35, 50), x_dir=(1, 0, 0), z_dir=(0, 0, 1))) as fillet1_piece_14:
        with BuildLine():
            CenterArc((FILLET1_R, -FILLET1_R), FILLET1_R, 90, 90)
            Line((0, -FILLET1_R), (0, 0))
            Line((0, 0), (FILLET1_R, 0))
        make_face()
    extrude(amount=87, mode=Mode.SUBTRACT)
    with BuildSketch(Plane(origin=(-17, 35, 140), x_dir=(0, 0, -1), z_dir=(1, 0, 0))) as fillet1_piece_15:
        with BuildLine():
            CenterArc((FILLET1_R, -FILLET1_R), FILLET1_R, 90, 90)
            Line((0, -FILLET1_R), (0, 0))
            Line((0, 0), (FILLET1_R, 0))
        make_face()
    extrude(amount=84, mode=Mode.SUBTRACT)
    with BuildSketch(Plane(origin=(75, 8.75, -25), x_dir=(0, 0, 1), z_dir=(1, 0, 0)), Plane(origin=(75, 26.25, -25), x_dir=(0, -1, 0), z_dir=(1, 0, 0)), Plane(origin=(75, 8.75, 25), x_dir=(0, 1, 0), z_dir=(1, 0, 0))) as fillet1_piece_16:
        with BuildLine():
            CenterArc((FILLET1_R, -FILLET1_R), FILLET1_R, 90, 90)
            Line((0, -FILLET1_R), (0, 0))
            Line((0, 0), (FILLET1_R, 0))
        make_face()
    extrude(amount=27, mode=Mode.SUBTRACT)
    with BuildSketch(Plane(origin=(75, 26.25, 25), x_dir=(0, -1, 0), z_dir=(1, 0, 0))) as fillet1_piece_17:
        with BuildLine():
            CenterArc((FILLET1_R, FILLET1_R), FILLET1_R, 180, 90)
            Line((0, FILLET1_R), (0, 0))
            Line((0, 0), (FILLET1_R, 0))
        make_face()
    extrude(amount=27, mode=Mode.SUBTRACT)
    with BuildSketch(Plane(origin=(105, 23.25, -25), x_dir=(-1, 0, 0), z_dir=(0, -1, 0)), Plane(origin=(105, 11.75, 25), x_dir=(-1, 0, 0), z_dir=(0, 1, 0))) as fillet1_piece_18:
        with BuildLine():
            CenterArc((FILLET1_R, -FILLET1_R), FILLET1_R, 90, 90)
            Line((0, -FILLET1_R), (0, 0))
            Line((0, 0), (FILLET1_R, 0))
        make_face()
    extrude(amount=11.5, mode=Mode.SUBTRACT)
    with BuildSketch(Plane(origin=(105, 26.25, 22), x_dir=(-1, 0, 0), z_dir=(0, 0, -1)), Plane(origin=(105, 8.75, -22), x_dir=(-1, 0, 0), z_dir=(0, 0, 1))) as fillet1_piece_19:
        with BuildLine():
            CenterArc((FILLET1_R, -FILLET1_R), FILLET1_R, 90, 90)
            Line((0, -FILLET1_R), (0, 0))
            Line((0, 0), (FILLET1_R, 0))
        make_face()
    extrude(amount=44, mode=Mode.SUBTRACT)
    with BuildSketch(Plane(origin=(-72, 35, -50), x_dir=(0, -1, 0), z_dir=(1, 0, 0))) as fillet1_piece_20:
        with BuildLine():
            CenterArc((FILLET1_R, -FILLET1_R), FILLET1_R, 90, 90)
            Line((0, -FILLET1_R), (0, 0))
            Line((0, 0), (FILLET1_R, 0))
        make_face()
    extrude(amount=154.5, mode=Mode.SUBTRACT)
    with BuildSketch(Plane(origin=(-20, 35, 42.5), x_dir=(1, 0, 0), z_dir=(0, 0, 1))) as fillet1_piece_21a_section:
        with BuildLine():
            CenterArc((FILLET1_R, -FILLET1_R), FILLET1_R, 90, 90)
            Line((0, -FILLET1_R), (0, 0))
            Line((0, 0), (FILLET1_R, 0))
        make_face()
    fillet1_piece_21a = extrude(amount=94.5, mode=Mode.PRIVATE)
    fillet1_piece_21a = split(fillet1_piece_21a, bisect_by=Plane(origin=(-19.320814657, 34.320814657, 50), z_dir=(0, 0, -1)), keep=Keep.TOP, mode=Mode.PRIVATE)
    with BuildSketch(Plane(origin=(-12.5, 35, 50), x_dir=(0, 0, -1), z_dir=(-1, 0, 0))) as fillet1_piece_21b_section:
        with BuildLine():
            CenterArc((FILLET1_R, FILLET1_R), FILLET1_R, 180, 90)
            Line((0, FILLET1_R), (0, 0))
            Line((0, 0), (FILLET1_R, 0))
        make_face()
    fillet1_piece_21b = extrude(amount=59.5, mode=Mode.PRIVATE)
    fillet1_piece_21b = split(fillet1_piece_21b, bisect_by=Plane(origin=(-20, 34.320814657, 49.320814657), z_dir=(1, 0, 0)), keep=Keep.TOP, mode=Mode.PRIVATE)
    fillet1_piece_21 = fillet1_piece_21a & fillet1_piece_21b
    add(fillet1_piece_21, mode=Mode.SUBTRACT)
    with BuildSketch(Plane(origin=(82.5, 35, 50), x_dir=(0, 0, -1), z_dir=(-1, 0, 0))) as fillet1_piece_22a_section:
        with BuildLine():
            CenterArc((FILLET1_R, FILLET1_R), FILLET1_R, 180, 90)
            Line((0, FILLET1_R), (0, 0))
            Line((0, 0), (FILLET1_R, 0))
        make_face()
    fillet1_piece_22a = extrude(amount=20, mode=Mode.PRIVATE)
    fillet1_piece_22a = split(fillet1_piece_22a, bisect_by=Plane(origin=(70, 34.320814657, 49.320814657), z_dir=(-1, 0, 0)), keep=Keep.TOP, mode=Mode.PRIVATE)
    with BuildSketch(Plane(origin=(70, 35, 137), x_dir=(-1, 0, 0), z_dir=(0, 0, -1))) as fillet1_piece_22b_section:
        with BuildLine():
            CenterArc((FILLET1_R, -FILLET1_R), FILLET1_R, 90, 90)
            Line((0, -FILLET1_R), (0, 0))
            Line((0, 0), (FILLET1_R, 0))
        make_face()
    fillet1_piece_22b = extrude(amount=94.5, mode=Mode.PRIVATE)
    fillet1_piece_22b = split(fillet1_piece_22b, bisect_by=Plane(origin=(69.320814657, 34.320814657, 50), z_dir=(0, 0, -1)), keep=Keep.TOP, mode=Mode.PRIVATE)
    fillet1_piece_22 = fillet1_piece_22a & fillet1_piece_22b
    add(fillet1_piece_22, mode=Mode.SUBTRACT)


solid = part.part
